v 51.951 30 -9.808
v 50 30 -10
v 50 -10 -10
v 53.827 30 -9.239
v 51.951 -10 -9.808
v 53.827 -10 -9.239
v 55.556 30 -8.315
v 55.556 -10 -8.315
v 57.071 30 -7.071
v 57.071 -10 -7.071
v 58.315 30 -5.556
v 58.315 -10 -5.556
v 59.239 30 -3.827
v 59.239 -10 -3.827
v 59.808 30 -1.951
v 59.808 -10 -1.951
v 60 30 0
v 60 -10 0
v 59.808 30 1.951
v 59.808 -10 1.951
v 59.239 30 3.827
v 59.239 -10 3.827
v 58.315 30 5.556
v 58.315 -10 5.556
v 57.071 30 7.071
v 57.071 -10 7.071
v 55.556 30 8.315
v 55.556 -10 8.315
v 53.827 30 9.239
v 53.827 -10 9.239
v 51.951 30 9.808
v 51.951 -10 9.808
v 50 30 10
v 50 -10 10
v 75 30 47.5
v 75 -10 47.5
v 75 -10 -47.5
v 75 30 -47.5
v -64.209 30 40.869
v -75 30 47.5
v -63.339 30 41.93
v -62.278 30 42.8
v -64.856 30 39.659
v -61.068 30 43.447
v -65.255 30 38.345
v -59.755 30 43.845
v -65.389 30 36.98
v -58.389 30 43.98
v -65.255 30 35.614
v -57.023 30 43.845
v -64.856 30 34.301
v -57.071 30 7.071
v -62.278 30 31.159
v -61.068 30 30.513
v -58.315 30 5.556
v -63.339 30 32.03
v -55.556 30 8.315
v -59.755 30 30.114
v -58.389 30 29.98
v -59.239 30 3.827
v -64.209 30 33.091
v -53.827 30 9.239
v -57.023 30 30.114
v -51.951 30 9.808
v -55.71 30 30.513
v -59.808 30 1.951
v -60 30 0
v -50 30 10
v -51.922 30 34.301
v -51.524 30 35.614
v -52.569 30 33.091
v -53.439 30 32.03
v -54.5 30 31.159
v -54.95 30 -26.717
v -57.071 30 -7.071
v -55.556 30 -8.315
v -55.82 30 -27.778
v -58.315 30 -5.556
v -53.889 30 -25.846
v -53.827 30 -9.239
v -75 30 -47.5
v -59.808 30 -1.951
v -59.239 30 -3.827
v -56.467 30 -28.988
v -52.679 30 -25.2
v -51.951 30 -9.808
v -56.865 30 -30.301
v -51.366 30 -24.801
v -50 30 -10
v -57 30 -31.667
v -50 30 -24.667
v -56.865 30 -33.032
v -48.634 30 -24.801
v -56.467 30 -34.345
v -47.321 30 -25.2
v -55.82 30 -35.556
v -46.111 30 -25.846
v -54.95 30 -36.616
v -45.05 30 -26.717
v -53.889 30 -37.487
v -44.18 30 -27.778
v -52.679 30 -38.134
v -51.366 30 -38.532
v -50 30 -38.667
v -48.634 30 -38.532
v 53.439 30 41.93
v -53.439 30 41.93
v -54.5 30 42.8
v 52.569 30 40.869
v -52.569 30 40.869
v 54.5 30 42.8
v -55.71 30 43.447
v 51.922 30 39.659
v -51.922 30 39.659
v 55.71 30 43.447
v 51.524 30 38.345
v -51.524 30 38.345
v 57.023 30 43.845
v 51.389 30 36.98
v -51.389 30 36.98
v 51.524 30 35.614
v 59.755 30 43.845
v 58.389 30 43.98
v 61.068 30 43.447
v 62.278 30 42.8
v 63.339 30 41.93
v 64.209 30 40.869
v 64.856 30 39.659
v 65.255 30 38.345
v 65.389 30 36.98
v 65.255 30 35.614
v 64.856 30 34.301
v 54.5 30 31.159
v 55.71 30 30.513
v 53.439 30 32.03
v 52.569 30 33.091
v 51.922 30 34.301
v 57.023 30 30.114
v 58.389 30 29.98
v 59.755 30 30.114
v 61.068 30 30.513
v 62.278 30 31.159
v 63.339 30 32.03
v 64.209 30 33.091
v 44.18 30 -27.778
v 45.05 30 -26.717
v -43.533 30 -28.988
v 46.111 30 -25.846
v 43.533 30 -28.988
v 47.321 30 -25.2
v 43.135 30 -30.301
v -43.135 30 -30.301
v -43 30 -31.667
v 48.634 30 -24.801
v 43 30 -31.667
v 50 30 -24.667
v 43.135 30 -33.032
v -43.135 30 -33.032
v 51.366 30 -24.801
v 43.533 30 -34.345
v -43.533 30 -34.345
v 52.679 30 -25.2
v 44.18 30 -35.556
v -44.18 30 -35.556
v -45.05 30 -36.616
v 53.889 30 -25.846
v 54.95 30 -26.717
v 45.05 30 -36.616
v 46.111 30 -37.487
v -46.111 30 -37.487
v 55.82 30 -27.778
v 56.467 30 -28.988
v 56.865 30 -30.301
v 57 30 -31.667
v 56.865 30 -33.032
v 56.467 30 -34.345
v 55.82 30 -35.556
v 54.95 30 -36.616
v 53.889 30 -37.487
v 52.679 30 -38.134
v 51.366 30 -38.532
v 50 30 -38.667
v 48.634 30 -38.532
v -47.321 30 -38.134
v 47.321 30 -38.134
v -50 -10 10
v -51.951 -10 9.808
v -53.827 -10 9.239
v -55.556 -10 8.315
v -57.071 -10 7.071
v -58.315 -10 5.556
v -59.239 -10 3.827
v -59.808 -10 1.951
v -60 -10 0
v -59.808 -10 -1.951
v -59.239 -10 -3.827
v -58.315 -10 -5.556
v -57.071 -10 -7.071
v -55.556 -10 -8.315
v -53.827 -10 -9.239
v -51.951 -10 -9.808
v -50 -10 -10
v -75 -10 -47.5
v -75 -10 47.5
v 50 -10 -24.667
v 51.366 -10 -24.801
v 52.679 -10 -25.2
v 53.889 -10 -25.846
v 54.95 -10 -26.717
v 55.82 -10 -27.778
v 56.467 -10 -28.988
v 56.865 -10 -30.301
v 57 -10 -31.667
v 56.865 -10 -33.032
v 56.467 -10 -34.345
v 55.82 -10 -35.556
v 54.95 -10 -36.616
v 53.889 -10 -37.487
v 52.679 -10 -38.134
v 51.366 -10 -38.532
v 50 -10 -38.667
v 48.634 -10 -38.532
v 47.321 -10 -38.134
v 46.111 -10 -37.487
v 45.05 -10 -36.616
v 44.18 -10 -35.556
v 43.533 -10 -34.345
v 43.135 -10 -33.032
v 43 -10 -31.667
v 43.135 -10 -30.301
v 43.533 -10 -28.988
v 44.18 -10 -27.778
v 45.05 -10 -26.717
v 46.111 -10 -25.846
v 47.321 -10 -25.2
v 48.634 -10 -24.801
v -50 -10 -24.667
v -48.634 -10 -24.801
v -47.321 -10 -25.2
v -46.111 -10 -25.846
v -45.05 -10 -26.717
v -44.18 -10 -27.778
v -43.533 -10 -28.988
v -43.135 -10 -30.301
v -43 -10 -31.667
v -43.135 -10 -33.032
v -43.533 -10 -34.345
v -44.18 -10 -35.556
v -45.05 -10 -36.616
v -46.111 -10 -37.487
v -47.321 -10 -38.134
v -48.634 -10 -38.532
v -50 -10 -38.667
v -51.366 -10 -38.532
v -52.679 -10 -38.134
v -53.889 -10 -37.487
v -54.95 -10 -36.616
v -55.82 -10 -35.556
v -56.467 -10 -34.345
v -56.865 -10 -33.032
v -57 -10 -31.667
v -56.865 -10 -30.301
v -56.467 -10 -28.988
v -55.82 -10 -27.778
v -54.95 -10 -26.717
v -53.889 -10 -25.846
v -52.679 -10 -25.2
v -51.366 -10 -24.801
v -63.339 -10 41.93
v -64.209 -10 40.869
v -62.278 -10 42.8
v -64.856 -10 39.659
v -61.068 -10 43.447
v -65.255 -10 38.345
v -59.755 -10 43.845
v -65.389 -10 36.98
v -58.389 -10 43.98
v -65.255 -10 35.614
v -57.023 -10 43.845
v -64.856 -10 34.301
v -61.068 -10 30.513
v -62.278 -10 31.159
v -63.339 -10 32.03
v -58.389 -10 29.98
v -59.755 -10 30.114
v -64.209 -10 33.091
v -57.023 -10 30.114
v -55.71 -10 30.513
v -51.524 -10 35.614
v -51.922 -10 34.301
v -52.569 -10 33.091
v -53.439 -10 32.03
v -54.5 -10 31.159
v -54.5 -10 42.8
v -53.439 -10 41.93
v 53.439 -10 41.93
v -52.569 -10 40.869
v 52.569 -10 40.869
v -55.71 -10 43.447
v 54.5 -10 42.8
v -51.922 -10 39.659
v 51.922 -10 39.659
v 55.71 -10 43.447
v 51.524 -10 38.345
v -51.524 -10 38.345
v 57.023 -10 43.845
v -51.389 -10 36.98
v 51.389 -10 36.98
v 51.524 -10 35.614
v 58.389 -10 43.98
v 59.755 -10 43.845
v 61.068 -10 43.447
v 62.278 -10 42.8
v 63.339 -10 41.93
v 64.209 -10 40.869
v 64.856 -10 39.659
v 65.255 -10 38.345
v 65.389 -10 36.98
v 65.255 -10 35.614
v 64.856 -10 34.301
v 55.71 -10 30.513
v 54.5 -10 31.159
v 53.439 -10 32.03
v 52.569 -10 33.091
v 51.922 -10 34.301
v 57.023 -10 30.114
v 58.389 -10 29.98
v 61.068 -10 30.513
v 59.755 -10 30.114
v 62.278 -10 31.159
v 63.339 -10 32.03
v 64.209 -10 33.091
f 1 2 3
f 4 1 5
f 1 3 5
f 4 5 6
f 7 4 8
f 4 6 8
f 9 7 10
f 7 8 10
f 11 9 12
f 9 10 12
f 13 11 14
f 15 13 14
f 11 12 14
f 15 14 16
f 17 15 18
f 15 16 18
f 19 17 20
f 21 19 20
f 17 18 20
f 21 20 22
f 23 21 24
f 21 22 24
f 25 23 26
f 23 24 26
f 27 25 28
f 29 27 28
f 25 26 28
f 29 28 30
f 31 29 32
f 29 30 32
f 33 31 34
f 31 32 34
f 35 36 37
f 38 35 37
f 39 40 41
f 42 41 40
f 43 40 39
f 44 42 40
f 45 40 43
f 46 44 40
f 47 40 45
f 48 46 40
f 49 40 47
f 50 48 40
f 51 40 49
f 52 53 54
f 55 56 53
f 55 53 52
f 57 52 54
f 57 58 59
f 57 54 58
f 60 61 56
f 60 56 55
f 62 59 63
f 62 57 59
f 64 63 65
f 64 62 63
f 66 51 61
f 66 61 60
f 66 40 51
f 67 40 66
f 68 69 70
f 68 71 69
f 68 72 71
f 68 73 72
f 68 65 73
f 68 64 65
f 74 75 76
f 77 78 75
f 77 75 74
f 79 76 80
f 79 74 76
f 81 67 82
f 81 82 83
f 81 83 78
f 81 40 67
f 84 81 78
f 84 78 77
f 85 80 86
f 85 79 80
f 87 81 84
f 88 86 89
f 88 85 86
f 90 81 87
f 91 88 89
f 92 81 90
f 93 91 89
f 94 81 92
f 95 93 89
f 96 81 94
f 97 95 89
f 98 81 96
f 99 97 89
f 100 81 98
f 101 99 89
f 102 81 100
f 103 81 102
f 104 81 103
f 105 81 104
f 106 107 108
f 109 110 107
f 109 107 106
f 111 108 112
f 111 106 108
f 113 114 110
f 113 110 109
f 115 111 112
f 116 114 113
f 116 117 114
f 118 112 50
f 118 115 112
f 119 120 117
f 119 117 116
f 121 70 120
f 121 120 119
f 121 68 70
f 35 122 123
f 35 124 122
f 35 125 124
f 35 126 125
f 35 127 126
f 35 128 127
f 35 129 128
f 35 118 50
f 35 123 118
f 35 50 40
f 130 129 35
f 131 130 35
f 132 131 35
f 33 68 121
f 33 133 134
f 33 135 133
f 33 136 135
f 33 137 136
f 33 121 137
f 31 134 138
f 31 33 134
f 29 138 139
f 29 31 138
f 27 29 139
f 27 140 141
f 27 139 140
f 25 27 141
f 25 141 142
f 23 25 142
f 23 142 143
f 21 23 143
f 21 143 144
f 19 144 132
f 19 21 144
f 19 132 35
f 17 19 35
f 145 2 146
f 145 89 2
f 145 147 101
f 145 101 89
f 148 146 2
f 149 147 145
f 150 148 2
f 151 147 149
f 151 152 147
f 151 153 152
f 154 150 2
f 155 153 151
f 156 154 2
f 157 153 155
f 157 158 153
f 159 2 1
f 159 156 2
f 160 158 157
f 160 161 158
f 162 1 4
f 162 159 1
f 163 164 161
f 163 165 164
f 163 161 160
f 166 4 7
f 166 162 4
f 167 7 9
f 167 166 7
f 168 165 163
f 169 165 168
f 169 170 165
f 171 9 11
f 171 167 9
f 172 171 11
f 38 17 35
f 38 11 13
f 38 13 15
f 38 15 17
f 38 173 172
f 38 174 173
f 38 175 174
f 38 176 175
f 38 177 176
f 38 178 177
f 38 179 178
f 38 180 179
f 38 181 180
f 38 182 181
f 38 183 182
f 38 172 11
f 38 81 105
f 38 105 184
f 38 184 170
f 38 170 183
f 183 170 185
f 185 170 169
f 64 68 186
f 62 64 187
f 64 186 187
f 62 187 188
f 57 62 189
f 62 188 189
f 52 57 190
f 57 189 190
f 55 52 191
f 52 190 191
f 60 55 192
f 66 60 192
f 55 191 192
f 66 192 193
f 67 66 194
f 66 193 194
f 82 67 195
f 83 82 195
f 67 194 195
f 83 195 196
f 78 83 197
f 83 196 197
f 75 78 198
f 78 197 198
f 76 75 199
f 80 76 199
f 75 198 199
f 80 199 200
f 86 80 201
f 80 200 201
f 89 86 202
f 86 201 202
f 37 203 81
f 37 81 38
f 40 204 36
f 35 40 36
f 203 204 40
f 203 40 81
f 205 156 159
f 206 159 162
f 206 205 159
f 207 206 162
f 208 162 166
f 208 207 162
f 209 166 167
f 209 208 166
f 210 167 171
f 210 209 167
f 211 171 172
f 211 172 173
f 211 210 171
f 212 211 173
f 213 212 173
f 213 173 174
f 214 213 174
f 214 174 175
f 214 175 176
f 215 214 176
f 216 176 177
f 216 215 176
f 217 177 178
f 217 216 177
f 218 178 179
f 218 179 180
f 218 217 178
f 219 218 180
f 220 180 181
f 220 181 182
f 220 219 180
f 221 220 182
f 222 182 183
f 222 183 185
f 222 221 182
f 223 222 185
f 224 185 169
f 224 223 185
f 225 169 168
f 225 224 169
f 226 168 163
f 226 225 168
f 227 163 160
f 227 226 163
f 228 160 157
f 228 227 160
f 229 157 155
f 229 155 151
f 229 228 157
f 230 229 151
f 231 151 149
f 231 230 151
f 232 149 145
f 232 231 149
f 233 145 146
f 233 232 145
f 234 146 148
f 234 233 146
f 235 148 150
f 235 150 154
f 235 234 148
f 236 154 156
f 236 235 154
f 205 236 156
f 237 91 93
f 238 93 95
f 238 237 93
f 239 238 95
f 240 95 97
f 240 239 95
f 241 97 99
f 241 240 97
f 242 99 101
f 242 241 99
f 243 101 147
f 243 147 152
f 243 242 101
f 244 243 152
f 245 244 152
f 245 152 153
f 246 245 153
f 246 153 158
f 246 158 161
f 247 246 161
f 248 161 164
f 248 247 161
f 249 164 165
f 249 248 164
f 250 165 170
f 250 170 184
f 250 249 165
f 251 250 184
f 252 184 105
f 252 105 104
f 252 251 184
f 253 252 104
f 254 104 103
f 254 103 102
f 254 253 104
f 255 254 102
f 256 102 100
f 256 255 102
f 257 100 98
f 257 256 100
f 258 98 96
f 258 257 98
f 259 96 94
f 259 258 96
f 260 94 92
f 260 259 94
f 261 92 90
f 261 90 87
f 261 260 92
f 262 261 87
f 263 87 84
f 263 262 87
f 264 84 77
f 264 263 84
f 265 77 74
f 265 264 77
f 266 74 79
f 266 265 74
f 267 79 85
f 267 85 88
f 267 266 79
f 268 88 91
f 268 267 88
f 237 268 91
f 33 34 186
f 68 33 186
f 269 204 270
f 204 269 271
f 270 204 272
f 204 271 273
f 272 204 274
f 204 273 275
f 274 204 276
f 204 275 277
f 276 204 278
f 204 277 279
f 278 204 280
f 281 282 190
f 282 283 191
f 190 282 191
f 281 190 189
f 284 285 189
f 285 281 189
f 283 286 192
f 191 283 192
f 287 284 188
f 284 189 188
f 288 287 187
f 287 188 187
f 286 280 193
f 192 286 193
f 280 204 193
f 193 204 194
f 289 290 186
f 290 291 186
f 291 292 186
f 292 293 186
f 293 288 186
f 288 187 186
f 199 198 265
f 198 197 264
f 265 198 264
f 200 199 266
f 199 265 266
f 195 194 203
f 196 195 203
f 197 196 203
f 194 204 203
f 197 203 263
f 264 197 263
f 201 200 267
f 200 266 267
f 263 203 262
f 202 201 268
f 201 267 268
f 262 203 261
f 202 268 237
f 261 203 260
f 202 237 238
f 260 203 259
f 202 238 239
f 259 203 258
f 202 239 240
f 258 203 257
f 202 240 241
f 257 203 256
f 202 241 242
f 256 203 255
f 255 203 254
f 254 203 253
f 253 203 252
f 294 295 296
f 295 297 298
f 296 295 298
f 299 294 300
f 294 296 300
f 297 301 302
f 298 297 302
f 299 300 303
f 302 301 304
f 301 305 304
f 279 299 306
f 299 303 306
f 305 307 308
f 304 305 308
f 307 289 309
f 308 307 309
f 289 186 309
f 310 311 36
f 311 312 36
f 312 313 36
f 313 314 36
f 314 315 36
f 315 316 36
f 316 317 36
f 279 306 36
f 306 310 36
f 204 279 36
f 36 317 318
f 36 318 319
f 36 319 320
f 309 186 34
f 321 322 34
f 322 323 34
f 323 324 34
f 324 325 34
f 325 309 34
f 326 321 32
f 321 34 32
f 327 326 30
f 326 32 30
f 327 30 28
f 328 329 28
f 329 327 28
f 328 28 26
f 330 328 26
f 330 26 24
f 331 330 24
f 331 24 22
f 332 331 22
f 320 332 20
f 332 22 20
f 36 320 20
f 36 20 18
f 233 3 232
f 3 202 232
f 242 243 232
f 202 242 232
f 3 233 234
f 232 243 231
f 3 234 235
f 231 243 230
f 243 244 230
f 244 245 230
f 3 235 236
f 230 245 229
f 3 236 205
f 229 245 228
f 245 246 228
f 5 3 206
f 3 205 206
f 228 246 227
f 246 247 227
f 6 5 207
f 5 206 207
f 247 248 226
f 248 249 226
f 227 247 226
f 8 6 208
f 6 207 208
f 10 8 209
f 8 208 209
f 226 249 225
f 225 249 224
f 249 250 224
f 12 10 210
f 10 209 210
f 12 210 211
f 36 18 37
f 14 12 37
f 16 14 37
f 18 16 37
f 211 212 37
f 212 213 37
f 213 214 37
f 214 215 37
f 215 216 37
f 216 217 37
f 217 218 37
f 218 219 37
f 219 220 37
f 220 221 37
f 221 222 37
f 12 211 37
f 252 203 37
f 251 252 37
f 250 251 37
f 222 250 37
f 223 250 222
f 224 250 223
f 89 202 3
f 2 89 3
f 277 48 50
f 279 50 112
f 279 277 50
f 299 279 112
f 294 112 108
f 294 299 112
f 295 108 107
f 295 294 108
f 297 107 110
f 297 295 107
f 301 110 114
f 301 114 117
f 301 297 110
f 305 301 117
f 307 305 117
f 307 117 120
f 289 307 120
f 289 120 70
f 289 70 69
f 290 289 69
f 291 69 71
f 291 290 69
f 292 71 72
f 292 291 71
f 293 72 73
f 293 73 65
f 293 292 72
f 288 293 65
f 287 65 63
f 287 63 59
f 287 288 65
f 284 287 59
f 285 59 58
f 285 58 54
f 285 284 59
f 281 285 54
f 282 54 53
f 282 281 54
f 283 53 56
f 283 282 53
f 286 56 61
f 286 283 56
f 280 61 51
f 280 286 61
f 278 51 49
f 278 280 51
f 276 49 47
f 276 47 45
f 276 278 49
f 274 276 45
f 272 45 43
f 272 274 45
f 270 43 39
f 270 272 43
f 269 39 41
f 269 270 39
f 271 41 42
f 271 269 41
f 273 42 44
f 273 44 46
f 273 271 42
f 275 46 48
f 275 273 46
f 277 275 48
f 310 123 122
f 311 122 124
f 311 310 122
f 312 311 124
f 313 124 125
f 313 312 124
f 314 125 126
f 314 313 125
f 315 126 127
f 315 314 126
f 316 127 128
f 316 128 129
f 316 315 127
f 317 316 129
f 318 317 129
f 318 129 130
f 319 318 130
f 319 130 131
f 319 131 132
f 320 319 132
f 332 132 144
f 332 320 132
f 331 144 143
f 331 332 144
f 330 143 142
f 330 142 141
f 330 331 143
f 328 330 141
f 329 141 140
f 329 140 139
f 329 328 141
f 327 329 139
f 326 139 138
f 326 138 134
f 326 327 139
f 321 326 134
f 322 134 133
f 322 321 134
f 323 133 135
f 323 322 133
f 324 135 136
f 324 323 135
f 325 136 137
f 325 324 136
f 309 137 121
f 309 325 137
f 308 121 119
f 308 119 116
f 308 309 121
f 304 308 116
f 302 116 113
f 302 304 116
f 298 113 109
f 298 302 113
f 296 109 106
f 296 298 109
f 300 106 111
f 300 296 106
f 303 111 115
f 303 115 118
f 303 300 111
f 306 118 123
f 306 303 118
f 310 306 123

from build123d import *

# Parameters (mm, degrees)
BOSS_EXTRUDE1_DEPTH      = 30
BOSS_EXTRUDE1_DEPTH_BACK = 10
SKETCH1_W                = 150
SKETCH1_H                = 95
SKETCH1_R                = 7


with BuildPart() as part:
    # Sketch1 → Boss-Extrude1 (new, two sides: drawn at the far end of the back side and taken through both)
    with BuildSketch(Plane(origin=(0, 0, 0), x_dir=(1, 0, 0), z_dir=(0, 1, 0)).offset(-BOSS_EXTRUDE1_DEPTH_BACK)):
        Rectangle(SKETCH1_W, SKETCH1_H)
        with Locations(Location((-50, 31.666666667, 0), (0, 0, 270))):
            Circle(SKETCH1_R, mode=Mode.SUBTRACT)
        with Locations(Location((50, 31.666666667, 0), (0, 0, 270))):
            Circle(SKETCH1_R, mode=Mode.SUBTRACT)
        with Locations(Location((-58.389104437, -36.979766144, 0), (0, 0, 270))):
            Circle(SKETCH1_R, mode=Mode.SUBTRACT)
        with Locations(Location((58.389104437, -36.979766144, 0), (0, 0, 270))):
            Circle(SKETCH1_R, mode=Mode.SUBTRACT)
        with BuildLine():
            Line((-50, 10), (50, 10))
            ThreePointArc((50, 10), (60, 0), (50, -10))
            Line((50, -10), (-50, -10))
            ThreePointArc((-50, -10), (-60, 0), (-50, 10))
        make_face(mode=Mode.SUBTRACT)
    extrude(amount=BOSS_EXTRUDE1_DEPTH + BOSS_EXTRUDE1_DEPTH_BACK)


solid = part.part
